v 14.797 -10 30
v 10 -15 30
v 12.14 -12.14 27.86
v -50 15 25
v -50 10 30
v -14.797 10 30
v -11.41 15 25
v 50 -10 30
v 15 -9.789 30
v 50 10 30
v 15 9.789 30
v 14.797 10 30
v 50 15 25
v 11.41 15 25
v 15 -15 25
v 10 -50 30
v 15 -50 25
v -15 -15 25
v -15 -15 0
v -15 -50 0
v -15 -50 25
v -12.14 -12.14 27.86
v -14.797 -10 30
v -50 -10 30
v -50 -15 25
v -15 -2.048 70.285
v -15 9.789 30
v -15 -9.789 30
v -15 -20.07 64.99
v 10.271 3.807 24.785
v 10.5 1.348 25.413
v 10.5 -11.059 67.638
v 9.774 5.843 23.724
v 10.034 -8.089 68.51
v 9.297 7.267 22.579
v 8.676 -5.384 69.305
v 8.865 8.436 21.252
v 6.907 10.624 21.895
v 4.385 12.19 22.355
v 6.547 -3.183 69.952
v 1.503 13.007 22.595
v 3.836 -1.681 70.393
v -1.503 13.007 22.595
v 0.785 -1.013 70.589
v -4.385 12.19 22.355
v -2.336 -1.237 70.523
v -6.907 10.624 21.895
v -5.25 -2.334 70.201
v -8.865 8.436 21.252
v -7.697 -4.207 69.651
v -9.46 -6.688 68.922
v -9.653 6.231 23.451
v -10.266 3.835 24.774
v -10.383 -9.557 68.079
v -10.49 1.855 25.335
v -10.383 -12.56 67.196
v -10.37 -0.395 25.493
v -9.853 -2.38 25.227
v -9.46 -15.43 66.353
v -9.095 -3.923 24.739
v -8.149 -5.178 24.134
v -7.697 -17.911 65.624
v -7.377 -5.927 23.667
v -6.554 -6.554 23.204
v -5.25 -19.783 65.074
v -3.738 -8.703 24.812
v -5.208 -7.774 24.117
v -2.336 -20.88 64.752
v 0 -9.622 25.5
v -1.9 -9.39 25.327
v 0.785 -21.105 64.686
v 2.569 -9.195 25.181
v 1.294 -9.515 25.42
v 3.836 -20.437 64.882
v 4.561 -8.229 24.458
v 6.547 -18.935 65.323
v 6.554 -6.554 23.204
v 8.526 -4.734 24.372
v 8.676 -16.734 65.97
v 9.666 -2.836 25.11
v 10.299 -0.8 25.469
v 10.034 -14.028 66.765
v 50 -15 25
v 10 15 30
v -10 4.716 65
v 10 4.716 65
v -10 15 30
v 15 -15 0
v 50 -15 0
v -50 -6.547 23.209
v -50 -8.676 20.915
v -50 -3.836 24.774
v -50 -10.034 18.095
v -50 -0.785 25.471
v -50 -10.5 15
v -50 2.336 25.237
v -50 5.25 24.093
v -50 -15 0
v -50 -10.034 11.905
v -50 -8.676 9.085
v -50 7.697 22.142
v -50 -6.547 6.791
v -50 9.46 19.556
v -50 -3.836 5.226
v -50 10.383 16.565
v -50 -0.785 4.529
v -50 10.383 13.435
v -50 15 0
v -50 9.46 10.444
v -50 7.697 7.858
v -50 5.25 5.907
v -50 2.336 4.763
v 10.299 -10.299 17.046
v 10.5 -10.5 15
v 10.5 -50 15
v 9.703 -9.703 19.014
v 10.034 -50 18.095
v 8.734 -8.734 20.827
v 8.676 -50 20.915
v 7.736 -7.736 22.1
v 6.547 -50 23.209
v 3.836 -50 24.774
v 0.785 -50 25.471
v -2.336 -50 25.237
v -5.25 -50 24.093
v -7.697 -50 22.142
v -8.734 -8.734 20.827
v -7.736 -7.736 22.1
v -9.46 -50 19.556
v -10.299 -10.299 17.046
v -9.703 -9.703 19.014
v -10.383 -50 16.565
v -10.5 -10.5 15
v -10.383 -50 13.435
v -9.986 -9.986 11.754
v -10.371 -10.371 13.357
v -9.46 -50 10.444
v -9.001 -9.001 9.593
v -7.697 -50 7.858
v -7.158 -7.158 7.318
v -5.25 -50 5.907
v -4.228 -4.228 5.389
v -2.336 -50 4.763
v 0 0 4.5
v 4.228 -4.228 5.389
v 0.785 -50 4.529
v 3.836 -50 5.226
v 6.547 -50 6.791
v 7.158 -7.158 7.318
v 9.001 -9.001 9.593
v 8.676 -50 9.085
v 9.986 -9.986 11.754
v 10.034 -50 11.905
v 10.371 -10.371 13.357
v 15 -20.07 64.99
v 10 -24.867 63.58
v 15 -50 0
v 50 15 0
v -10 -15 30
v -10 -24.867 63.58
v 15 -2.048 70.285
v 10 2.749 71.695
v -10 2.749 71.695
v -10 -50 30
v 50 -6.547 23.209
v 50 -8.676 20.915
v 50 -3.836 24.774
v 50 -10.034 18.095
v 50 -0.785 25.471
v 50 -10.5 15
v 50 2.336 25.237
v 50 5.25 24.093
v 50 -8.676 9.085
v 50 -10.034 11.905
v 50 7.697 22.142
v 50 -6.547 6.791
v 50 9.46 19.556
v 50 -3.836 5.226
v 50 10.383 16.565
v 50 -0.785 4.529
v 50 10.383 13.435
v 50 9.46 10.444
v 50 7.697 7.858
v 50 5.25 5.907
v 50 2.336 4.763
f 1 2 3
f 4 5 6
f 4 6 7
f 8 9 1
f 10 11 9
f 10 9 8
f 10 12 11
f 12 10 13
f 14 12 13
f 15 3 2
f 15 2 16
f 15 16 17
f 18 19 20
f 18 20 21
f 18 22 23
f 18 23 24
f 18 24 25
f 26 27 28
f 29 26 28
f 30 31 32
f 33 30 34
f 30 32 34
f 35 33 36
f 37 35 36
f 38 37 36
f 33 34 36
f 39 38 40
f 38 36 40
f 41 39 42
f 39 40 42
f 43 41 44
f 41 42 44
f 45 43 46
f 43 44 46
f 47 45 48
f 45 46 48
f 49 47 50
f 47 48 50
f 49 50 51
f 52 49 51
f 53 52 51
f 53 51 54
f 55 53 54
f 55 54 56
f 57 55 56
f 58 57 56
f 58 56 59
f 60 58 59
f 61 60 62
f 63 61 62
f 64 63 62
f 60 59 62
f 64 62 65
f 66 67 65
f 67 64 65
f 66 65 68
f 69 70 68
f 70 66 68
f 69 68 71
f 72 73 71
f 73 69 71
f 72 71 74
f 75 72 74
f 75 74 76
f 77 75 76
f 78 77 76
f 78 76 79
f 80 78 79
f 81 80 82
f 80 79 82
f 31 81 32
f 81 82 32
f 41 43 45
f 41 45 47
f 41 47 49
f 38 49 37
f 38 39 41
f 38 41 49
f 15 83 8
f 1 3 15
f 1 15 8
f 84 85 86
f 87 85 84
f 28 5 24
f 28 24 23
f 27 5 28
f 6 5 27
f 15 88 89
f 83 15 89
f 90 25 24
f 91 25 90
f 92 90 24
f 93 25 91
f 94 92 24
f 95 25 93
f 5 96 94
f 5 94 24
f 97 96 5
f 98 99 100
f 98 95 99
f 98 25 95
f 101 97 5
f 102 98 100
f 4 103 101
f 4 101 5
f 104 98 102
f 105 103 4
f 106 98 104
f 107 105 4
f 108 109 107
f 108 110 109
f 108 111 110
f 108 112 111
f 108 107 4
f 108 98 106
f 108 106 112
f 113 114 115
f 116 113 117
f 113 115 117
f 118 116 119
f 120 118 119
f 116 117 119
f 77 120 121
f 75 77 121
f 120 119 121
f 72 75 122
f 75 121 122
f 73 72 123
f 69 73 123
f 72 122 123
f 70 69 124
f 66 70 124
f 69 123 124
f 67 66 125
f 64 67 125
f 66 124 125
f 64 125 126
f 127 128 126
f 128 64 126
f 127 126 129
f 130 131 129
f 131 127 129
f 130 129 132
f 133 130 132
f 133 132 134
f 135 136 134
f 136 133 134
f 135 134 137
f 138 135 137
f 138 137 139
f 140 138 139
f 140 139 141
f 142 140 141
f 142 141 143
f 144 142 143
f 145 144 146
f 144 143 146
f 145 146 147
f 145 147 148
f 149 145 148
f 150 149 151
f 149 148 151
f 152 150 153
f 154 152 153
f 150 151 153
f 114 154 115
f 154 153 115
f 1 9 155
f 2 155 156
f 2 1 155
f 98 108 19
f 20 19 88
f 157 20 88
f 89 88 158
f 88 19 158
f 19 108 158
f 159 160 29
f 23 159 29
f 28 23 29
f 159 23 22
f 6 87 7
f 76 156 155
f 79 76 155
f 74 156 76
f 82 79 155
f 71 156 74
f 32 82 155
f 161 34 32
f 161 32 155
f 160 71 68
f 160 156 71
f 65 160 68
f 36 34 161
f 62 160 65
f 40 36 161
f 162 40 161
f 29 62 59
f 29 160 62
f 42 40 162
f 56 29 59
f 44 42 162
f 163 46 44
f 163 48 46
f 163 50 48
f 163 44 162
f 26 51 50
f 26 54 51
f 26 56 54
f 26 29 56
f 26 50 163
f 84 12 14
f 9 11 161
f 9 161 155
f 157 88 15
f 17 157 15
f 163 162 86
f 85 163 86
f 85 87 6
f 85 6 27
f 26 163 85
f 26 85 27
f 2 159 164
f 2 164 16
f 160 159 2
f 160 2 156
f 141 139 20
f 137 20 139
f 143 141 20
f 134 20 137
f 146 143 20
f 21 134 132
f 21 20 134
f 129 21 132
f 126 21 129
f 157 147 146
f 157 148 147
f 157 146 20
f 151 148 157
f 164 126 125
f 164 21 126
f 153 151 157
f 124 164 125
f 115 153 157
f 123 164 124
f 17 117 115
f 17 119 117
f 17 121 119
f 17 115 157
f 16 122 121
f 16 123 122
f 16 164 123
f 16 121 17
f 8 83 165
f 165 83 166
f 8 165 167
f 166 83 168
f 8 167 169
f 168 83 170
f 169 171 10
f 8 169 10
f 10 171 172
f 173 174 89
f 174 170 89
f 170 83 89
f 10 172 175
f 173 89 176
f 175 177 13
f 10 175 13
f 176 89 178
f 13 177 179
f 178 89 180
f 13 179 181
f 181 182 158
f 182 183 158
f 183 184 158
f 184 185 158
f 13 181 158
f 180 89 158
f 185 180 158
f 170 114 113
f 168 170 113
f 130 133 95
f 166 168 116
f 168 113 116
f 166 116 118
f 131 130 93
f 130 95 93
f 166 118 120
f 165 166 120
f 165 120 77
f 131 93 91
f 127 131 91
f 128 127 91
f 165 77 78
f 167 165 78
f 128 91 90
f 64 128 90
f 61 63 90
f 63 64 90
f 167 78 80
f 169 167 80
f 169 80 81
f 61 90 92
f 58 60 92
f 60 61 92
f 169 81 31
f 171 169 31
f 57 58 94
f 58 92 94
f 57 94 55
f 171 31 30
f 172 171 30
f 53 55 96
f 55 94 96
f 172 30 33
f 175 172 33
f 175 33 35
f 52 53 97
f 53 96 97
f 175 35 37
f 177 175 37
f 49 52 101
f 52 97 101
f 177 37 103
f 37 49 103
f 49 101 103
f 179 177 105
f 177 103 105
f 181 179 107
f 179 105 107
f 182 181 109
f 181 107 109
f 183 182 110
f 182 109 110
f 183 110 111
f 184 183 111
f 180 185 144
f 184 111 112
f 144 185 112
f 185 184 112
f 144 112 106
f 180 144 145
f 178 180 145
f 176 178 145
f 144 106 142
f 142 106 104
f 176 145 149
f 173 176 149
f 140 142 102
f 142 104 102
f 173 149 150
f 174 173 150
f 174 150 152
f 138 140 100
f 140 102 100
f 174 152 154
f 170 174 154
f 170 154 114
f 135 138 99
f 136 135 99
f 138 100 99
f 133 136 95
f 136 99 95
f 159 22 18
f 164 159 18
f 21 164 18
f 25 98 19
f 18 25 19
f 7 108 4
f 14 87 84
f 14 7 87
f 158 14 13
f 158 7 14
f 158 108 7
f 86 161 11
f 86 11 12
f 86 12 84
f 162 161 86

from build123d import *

# Parameters (mm, degrees)
F0_W          = 100
F0_H          = 30
F1_DEPTH      = 30
F3_R          = 10.5
F4_DEPTH      = 100
F5_W          = 30
F5_H          = 30
F6_DEPTH      = 35
F2_W          = 30
F2_H          = 30
F7_DEPTH      = 35
F9_DEPTH      = 5
F10_DEPTH     = 35
F11_DEPTH     = 30
F12_DEPTH     = 5
F13_R         = 10.5
F14_DEPTH     = 50
F15_R         = 10.5
F16_DEPTH     = 50
F17_T4_DEPTH  = 78.1749423251
F17_T9_DEPTH  = 78.1749423251
F17_T14_DEPTH = 60.7168298797
F17_T19_DEPTH = 60.7168298797
F18_T4_DEPTH  = 52.8584149398
F18_T9_DEPTH  = 60.7168298797
F18_T15_DEPTH = 60.7168298797
F18_T21_DEPTH = 60.7168298797
F18_T27_DEPTH = 60.7168298797
F18_T33_DEPTH = 52.8584149398


# Not quite as in the source:
# - a fillet or chamfer that OpenCascade refuses, or shapes differently, is made with other operations: its cross-section is extruded or revolved along the edge and cut away or added


with BuildPart() as f1:
    # F0 (on Top) → F1 (new body)
    with BuildSketch(Plane.XY):
        Rectangle(F0_W, F0_H)
    extrude(amount=F1_DEPTH)

    # F3 (on face) → F4 (cut)
    with BuildSketch(Plane(origin=(-50, 0, 0), x_dir=(0, -1, 0), z_dir=(-1, 0, 0))):
        with Locations((0, 15)):
            Circle(F3_R)
    extrude(amount=-F4_DEPTH, mode=Mode.SUBTRACT)

    # F5 (on face) → F6 (join)
    with BuildSketch(Plane.XZ.offset(15)):
        with Locations((0, 15)):
            Rectangle(F5_W, F5_H)
    extrude(amount=F6_DEPTH)

    # F2 (on face) → F7 (join)
    with BuildSketch(Plane.XY.offset(30)):
        Rectangle(F2_W, F2_H)
    extrude(amount=F7_DEPTH)

    # F8 (on face) → F9 (join)
    with BuildSketch(Plane(origin=(-15, 0, 0), x_dir=(0, -1, 0), z_dir=(-1, 0, 0))):
        Polygon((15, 65), (15, 30), (24.8667589854, 63.5804566247), (-2.7490875563, 71.6946673709), (-4.7161444721, 65), align=None)
        Polygon((-15, 30), (15, 30), (15, 65), (-4.7161444721, 65), align=None)
    extrude(amount=F9_DEPTH)

    # F10 (cut, through all): a face of the model
    f10_faces = [f1.faces().sort_by_distance(p)[0] for p in [
        (0, 0, 65),
    ]]
    extrude(f10_faces, amount=-F10_DEPTH, mode=Mode.SUBTRACT)

    # F8 (on face) → F11 (join)
    with BuildSketch(Plane(origin=(-15, 0, 0), x_dir=(0, -1, 0), z_dir=(-1, 0, 0))):
        Polygon((-15, 30), (15, 30), (15, 65), (-4.7161444721, 65), align=None)
        Polygon((15, 65), (15, 30), (24.8667589854, 63.5804566247), (-2.7490875563, 71.6946673709), (-4.7161444721, 65), align=None)
    extrude(amount=-F11_DEPTH)

    # F12 (cut): a face of the model
    f12_faces = [f1.faces().sort_by_distance(p)[0] for p in [
        (-20, -5.0118640534, 48.8916696379),
    ]]
    extrude(f12_faces, amount=-F12_DEPTH, mode=Mode.SUBTRACT)

    # F13 (on face) → F14 (cut)
    with BuildSketch(Plane.XZ.offset(50)):
        with Locations((0, 15)):
            Circle(F13_R)
    extrude(amount=-F14_DEPTH, mode=Mode.SUBTRACT)

    # F15 (on face) → F16 (cut)
    with BuildSketch(Plane(origin=(0, -19.1730464608, 65.2534085396), x_dir=(1, 0, 0), z_dir=(0, -0.2819073996, 0.9594416178))):
        with Locations((0, 8.4572219875)):
            Circle(F15_R)
    extrude(amount=-F16_DEPTH, mode=Mode.SUBTRACT)

    # F17: chamfer of 5 on 4 edges, made by hand


with BuildPart() as f17_tool2:
    # F17_s3 → F17_t4 (new body)
    with BuildSketch(Plane(origin=(0, -22.7979287792, 77.5903069724), x_dir=(1, 0, 0), z_dir=(0, 0.2819073996, -0.9594416178))):
        Polygon((-10, -22.8488462553), (-15, -17.8488462553), (-15, -22.8488462553), align=None)
    extrude(amount=F17_T4_DEPTH)

    split(bisect_by=Plane.XY.offset(30), keep=Keep.TOP)


with BuildPart() as f1_1:
    add(f1.part)

    # F17_t1: cut F17_tool2
    add(f17_tool2.part, mode=Mode.SUBTRACT)


with BuildPart() as f17_tool7:
    # F17_s8 → F17_t9 (new body)
    with BuildSketch(Plane(origin=(0, -22.7979287792, 77.5903069724), x_dir=(1, 0, 0), z_dir=(0, 0.2819073996, -0.9594416178))):
        Polygon((15, -17.8488462553), (10, -22.8488462553), (15, -22.8488462553), align=None)
    extrude(amount=F17_T9_DEPTH)

    split(bisect_by=Plane.XY.offset(30), keep=Keep.TOP)


with BuildPart() as f1_2:
    add(f1_1.part)

    # F17_t6: cut F17_tool7
    add(f17_tool7.part, mode=Mode.SUBTRACT)


with BuildPart() as f17_tool12:
    # F17_s13 → F17_t14 (new body)
    with BuildSketch(Plane(origin=(0, -5.6814051569, 19.3360534821), x_dir=(1, 0, 0), z_dir=(0, -0.2819073996, 0.9594416178))):
        Polygon((15, -0.9344022802), (10, -5.9344022802), (15, -5.9344022802), align=None)
    extrude(amount=F17_T14_DEPTH)

    split(bisect_by=Plane.XY.offset(30), keep=Keep.TOP)


with BuildPart() as f1_3:
    add(f1_2.part)

    # F17_t11: cut F17_tool12
    add(f17_tool12.part, mode=Mode.SUBTRACT)


with BuildPart() as f17_tool17:
    # F17_s18 → F17_t19 (new body)
    with BuildSketch(Plane(origin=(0, -5.6814051569, 19.3360534821), x_dir=(1, 0, 0), z_dir=(0, -0.2819073996, 0.9594416178))):
        Polygon((-10, -5.9344022802), (-15, -0.9344022802), (-15, -5.9344022802), align=None)
    extrude(amount=F17_T19_DEPTH)

    split(bisect_by=Plane.XY.offset(30), keep=Keep.TOP)


with BuildPart() as f1_4:
    add(f1_3.part)

    # F17_t16: cut F17_tool17
    add(f17_tool17.part, mode=Mode.SUBTRACT)

    # F18: chamfer of 5 on 6 edges, made by hand


with BuildPart() as f18_tool2:
    # F18_s3 → F18_t4 (new body)
    with BuildSketch(Plane.YZ.offset(62.8584149398)):
        Polygon((10, 30), (15, 25), (15, 30), align=None)
    extrude(amount=-F18_T4_DEPTH)

    split(bisect_by=Plane(origin=(16.4244231276, 15.7582750978, 4.6301664136), x_dir=(-0.6923221184, 0.7215885839, 0), z_dir=(0.7071067812, 0.6784276741, 0.1993386339)), keep=Keep.TOP)


with BuildPart() as f1_5:
    add(f1_4.part)

    # F18_t1: cut F18_tool2
    add(f18_tool2.part, mode=Mode.SUBTRACT)


with BuildPart() as f18_tool7:
    # F18_s8 → F18_t9 (new body)
    with BuildSketch(Plane.YZ.offset(-2.1415850602)):
        Polygon((-10, 30), (-15, 25), (-15, 30), align=None)
    extrude(amount=-F18_T9_DEPTH)

    split(bisect_by=Plane(origin=(-7.9672011401, -7.6440643516, -2.2460129554), x_dir=(0.6923221184, -0.7215885839, 0), z_dir=(-0.7071067812, -0.6784276741, -0.1993386339)), keep=Keep.TOP)

    split(bisect_by=Plane(origin=(-20, 0, 20), x_dir=(0, 1, 0), z_dir=(-0.7071067812, 0, 0.7071067812)), keep=Keep.TOP)


with BuildPart() as f1_6:
    add(f1_5.part)

    # F18_t6: cut F18_tool7
    add(f18_tool7.part, mode=Mode.SUBTRACT)


with BuildPart() as f18_tool13:
    # F18_s14 → F18_t15 (new body)
    with BuildSketch(Plane.YZ.offset(2.1415850602)):
        Polygon((-15, 25), (-10, 30), (-15, 30), align=None)
    extrude(amount=F18_T15_DEPTH)

    split(bisect_by=Plane(origin=(7.9672011401, -7.6440643516, -2.2460129554), x_dir=(0.6923221184, 0.7215885839, 0), z_dir=(0.7071067812, -0.6784276741, -0.1993386339)), keep=Keep.TOP)

    split(bisect_by=Plane(origin=(20, 0, 20), x_dir=(0, 1, 0), z_dir=(0.7071067812, 0, 0.7071067812)), keep=Keep.TOP)


with BuildPart() as f1_7:
    add(f1_6.part)

    # F18_t12: cut F18_tool13
    add(f18_tool13.part, mode=Mode.SUBTRACT)


with BuildPart() as f18_tool19:
    # F18_s20 → F18_t21 (new body)
    with BuildSketch(Plane.XZ.offset(2.1415850602)):
        Polygon((-10, 30), (-15, 25), (-15, 30), align=None)
    extrude(amount=F18_T21_DEPTH)

    split(bisect_by=Plane(origin=(-7.9672011401, -7.6440643516, -2.2460129554), x_dir=(0.6923221184, -0.7215885839, 0), z_dir=(-0.7071067812, -0.6784276741, -0.1993386339)), keep=Keep.TOP)

    split(bisect_by=Plane(origin=(0, -20, 20), x_dir=(1, 0, 0), z_dir=(0, -0.7071067812, 0.7071067812)), keep=Keep.TOP)


with BuildPart() as f1_8:
    add(f1_7.part)

    # F18_t18: cut F18_tool19
    add(f18_tool19.part, mode=Mode.SUBTRACT)


with BuildPart() as f18_tool25:
    # F18_s26 → F18_t27 (new body)
    with BuildSketch(Plane.XZ.offset(2.1415850602)):
        Polygon((10, 30), (15, 25), (15, 30), align=None)
    extrude(amount=F18_T27_DEPTH)

    split(bisect_by=Plane(origin=(7.9672011401, -7.6440643516, -2.2460129554), x_dir=(0.6923221184, 0.7215885839, 0), z_dir=(0.7071067812, -0.6784276741, -0.1993386339)), keep=Keep.TOP)

    split(bisect_by=Plane(origin=(0, -20, 20), x_dir=(1, 0, 0), z_dir=(0, -0.7071067812, 0.7071067812)), keep=Keep.TOP)


with BuildPart() as f1_9:
    add(f1_8.part)

    # F18_t24: cut F18_tool25
    add(f18_tool25.part, mode=Mode.SUBTRACT)


with BuildPart() as f18_tool31:
    # F18_s32 → F18_t33 (new body)
    with BuildSketch(Plane.YZ.offset(-62.8584149398)):
        Polygon((10, 30), (15, 25), (15, 30), align=None)
    extrude(amount=F18_T33_DEPTH)

    split(bisect_by=Plane(origin=(-16.4244231276, 15.7582750978, 4.6301664136), x_dir=(-0.6923221184, -0.7215885839, 0), z_dir=(-0.7071067812, 0.6784276741, 0.1993386339)), keep=Keep.TOP)


with BuildPart() as f1_10:
    add(f1_9.part)

    # F18_t30: cut F18_tool31
    add(f18_tool31.part, mode=Mode.SUBTRACT)


solid = f1_10.part
